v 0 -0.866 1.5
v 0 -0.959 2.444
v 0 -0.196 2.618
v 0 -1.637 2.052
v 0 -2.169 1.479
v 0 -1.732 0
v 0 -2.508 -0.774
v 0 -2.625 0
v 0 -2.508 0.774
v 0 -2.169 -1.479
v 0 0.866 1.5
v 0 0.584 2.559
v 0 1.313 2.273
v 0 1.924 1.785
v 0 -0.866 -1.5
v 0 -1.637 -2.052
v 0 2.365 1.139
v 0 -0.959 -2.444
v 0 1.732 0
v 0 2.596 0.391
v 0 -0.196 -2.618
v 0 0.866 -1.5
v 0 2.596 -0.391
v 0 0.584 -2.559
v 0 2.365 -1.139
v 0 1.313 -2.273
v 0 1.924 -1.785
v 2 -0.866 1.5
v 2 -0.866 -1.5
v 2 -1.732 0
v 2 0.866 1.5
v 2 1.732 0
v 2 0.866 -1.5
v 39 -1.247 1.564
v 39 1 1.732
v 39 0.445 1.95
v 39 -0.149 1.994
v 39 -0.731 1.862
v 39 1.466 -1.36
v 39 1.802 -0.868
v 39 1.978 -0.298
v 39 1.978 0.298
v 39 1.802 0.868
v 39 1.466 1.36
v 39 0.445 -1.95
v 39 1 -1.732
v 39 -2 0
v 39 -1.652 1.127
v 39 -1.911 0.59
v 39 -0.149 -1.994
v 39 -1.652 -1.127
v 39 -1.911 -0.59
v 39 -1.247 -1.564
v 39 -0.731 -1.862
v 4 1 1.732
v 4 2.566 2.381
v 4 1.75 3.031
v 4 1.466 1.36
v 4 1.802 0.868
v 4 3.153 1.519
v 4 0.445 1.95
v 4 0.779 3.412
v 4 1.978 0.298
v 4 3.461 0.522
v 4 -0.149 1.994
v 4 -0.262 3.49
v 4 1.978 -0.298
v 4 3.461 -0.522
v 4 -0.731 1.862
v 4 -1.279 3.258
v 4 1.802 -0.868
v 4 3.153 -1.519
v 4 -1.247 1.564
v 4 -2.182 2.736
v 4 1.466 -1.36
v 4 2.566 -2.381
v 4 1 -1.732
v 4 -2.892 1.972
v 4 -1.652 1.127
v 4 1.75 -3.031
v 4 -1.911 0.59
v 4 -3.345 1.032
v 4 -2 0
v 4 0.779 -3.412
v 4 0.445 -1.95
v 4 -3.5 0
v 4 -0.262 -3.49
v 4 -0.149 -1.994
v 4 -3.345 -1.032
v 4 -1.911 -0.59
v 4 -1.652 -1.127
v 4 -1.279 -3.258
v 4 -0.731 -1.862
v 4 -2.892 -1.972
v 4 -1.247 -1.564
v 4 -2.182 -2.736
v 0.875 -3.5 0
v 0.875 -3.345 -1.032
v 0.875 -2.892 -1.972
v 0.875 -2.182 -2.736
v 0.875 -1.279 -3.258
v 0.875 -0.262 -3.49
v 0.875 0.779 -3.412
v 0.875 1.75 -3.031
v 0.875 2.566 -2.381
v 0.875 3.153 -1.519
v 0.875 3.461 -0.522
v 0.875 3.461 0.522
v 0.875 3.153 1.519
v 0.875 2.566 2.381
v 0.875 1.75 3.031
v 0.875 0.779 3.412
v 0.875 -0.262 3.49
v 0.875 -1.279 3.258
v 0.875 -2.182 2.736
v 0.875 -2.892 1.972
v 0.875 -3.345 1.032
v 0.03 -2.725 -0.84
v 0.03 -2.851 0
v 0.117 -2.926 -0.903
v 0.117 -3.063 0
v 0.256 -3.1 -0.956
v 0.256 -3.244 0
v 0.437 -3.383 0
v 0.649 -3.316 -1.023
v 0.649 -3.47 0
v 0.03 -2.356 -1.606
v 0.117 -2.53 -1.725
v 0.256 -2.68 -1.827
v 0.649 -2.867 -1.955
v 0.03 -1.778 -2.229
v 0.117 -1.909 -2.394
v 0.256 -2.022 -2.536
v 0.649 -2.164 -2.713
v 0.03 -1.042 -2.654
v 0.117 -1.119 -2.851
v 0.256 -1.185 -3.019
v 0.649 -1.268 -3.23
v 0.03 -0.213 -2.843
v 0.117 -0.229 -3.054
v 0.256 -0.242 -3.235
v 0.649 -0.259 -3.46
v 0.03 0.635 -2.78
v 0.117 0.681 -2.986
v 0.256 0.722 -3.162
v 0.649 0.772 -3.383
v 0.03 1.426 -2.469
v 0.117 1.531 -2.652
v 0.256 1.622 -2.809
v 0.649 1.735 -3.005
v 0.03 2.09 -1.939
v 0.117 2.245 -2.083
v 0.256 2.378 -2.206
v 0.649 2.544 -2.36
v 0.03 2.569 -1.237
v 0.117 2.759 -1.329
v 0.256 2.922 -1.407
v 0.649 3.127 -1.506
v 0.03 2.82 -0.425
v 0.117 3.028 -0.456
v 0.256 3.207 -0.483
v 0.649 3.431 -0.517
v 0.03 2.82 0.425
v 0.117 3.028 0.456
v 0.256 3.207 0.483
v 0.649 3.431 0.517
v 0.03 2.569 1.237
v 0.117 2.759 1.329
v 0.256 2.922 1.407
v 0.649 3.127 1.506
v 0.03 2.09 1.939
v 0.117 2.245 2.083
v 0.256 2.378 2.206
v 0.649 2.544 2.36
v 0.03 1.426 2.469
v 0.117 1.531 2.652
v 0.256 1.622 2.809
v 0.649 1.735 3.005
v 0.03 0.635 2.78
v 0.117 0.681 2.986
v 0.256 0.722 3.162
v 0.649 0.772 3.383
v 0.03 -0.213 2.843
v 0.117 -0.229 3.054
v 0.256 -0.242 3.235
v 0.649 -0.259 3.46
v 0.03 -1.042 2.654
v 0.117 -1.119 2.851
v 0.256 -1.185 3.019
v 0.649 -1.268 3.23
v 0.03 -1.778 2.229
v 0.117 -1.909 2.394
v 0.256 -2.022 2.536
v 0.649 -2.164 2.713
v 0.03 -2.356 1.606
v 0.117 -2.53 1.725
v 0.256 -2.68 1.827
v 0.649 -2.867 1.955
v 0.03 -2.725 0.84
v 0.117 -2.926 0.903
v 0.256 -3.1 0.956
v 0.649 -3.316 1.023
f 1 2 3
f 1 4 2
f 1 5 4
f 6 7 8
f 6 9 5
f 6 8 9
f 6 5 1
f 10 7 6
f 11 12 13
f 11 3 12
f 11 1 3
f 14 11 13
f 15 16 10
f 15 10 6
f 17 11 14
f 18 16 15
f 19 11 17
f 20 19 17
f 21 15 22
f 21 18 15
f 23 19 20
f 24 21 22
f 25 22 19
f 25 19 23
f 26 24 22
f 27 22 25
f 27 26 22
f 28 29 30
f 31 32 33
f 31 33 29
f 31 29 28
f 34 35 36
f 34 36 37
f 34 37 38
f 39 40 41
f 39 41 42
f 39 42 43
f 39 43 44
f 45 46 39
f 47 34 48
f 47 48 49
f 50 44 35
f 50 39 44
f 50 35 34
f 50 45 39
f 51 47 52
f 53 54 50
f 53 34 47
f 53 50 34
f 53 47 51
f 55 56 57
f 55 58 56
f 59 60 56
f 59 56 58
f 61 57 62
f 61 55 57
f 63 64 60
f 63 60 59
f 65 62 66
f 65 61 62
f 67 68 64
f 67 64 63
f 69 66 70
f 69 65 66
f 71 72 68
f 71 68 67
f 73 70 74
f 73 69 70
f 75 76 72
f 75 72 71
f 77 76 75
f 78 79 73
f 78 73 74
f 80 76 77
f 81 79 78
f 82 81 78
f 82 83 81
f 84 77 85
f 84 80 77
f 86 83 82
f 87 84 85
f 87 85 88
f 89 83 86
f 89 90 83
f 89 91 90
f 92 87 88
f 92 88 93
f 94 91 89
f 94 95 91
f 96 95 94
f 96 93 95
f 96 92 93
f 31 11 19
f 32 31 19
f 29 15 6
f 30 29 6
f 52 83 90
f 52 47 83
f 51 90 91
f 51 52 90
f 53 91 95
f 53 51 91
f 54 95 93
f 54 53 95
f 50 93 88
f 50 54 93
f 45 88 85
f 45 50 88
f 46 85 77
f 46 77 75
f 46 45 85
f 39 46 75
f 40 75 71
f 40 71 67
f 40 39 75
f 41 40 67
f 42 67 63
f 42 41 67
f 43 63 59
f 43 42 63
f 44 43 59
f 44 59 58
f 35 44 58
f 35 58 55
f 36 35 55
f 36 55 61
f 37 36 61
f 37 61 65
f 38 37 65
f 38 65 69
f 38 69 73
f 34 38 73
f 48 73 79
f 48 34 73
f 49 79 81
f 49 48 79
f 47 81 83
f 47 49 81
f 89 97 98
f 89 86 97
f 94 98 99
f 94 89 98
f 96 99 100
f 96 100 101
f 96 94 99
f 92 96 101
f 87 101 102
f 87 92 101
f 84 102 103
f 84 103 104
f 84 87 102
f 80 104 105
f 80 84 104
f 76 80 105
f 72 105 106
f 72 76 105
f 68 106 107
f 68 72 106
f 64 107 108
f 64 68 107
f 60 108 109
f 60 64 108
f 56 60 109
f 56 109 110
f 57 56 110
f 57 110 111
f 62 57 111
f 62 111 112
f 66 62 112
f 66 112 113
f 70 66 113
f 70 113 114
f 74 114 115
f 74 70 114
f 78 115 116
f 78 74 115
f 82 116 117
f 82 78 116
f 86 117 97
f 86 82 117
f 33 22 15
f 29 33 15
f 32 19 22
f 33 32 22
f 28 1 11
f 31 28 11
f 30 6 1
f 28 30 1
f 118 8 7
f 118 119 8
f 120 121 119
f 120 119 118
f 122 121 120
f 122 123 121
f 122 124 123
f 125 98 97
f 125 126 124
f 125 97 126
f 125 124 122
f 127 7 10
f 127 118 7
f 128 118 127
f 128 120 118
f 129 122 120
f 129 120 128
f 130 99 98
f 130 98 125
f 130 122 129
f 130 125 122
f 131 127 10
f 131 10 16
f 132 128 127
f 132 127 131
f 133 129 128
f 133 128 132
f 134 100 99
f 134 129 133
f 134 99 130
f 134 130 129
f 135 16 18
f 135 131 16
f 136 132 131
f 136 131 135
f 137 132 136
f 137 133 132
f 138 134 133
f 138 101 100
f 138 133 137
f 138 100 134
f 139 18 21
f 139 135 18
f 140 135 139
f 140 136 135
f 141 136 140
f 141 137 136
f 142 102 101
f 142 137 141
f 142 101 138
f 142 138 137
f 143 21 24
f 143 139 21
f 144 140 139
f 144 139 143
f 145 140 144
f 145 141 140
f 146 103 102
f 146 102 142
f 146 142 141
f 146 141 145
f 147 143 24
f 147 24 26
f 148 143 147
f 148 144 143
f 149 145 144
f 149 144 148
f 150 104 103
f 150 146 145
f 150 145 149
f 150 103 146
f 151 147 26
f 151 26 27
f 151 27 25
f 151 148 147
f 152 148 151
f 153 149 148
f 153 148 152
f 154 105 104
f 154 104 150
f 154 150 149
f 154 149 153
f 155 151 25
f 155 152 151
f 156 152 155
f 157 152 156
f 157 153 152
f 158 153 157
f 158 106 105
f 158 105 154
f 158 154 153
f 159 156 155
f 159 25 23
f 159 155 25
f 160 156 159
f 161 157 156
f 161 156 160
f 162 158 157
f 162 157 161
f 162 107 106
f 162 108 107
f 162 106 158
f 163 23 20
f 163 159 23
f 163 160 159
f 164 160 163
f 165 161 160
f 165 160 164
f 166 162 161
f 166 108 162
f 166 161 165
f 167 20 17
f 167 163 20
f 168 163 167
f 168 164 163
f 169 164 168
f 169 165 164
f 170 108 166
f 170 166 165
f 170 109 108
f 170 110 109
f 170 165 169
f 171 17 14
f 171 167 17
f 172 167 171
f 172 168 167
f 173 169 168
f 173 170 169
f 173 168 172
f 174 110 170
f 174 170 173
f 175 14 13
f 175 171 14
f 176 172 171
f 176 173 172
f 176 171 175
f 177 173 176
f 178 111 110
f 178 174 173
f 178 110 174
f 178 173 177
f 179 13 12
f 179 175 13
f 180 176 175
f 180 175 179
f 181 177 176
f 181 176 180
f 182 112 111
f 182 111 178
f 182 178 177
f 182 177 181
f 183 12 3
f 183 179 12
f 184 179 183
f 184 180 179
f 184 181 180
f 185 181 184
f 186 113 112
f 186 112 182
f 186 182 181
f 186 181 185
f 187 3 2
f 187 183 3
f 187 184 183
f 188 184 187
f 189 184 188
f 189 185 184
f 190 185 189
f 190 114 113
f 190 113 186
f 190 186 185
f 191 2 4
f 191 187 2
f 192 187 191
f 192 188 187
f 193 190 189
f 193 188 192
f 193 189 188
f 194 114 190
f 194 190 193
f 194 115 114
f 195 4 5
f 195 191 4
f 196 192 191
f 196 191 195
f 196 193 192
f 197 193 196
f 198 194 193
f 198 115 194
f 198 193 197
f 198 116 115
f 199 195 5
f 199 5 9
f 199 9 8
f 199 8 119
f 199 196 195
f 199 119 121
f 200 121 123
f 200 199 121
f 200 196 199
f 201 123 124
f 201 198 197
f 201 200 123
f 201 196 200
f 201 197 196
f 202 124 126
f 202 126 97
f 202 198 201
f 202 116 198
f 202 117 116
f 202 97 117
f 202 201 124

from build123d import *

# Parameters (mm, degrees)
CUT_EXTRUDE1_DEPTH = 2


with BuildPart() as part:
    # Sketch1 → Revolve1 (revolve)
    with BuildSketch(Plane.XY, mode=Mode.PRIVATE) as revolve1_sk:
        with BuildLine():
            Line((0, 0), (0, 2.625))
            ThreePointArc((0, 2.625), (0.256281566, 3.243718434), (0.875, 3.5))
            Line((0.875, 3.5), (4, 3.5))
            Line((4, 3.5), (4, 2))
            Line((4, 2), (39, 2))
            Line((39, 2), (39, 0))
            Line((39, 0), (0, 0))
        make_face()
    revolve(revolve1_sk.sketch.rotate(Axis((0, 0, 0), (1, 0, 0)), 180), axis=Axis((0, 0, 0), (1, 0, 0)))

    # Sketch2 → Cut-Extrude1 (cut)
    with BuildSketch(Plane.ZY):
        Polygon((0, 1.732050808), (-1.5, 0.866025404), (-1.5, -0.866025404), (0, -1.732050808), (1.5, -0.866025404), (1.5, 0.866025404), align=None)
    extrude(amount=-CUT_EXTRUDE1_DEPTH, mode=Mode.SUBTRACT)


solid = part.part
